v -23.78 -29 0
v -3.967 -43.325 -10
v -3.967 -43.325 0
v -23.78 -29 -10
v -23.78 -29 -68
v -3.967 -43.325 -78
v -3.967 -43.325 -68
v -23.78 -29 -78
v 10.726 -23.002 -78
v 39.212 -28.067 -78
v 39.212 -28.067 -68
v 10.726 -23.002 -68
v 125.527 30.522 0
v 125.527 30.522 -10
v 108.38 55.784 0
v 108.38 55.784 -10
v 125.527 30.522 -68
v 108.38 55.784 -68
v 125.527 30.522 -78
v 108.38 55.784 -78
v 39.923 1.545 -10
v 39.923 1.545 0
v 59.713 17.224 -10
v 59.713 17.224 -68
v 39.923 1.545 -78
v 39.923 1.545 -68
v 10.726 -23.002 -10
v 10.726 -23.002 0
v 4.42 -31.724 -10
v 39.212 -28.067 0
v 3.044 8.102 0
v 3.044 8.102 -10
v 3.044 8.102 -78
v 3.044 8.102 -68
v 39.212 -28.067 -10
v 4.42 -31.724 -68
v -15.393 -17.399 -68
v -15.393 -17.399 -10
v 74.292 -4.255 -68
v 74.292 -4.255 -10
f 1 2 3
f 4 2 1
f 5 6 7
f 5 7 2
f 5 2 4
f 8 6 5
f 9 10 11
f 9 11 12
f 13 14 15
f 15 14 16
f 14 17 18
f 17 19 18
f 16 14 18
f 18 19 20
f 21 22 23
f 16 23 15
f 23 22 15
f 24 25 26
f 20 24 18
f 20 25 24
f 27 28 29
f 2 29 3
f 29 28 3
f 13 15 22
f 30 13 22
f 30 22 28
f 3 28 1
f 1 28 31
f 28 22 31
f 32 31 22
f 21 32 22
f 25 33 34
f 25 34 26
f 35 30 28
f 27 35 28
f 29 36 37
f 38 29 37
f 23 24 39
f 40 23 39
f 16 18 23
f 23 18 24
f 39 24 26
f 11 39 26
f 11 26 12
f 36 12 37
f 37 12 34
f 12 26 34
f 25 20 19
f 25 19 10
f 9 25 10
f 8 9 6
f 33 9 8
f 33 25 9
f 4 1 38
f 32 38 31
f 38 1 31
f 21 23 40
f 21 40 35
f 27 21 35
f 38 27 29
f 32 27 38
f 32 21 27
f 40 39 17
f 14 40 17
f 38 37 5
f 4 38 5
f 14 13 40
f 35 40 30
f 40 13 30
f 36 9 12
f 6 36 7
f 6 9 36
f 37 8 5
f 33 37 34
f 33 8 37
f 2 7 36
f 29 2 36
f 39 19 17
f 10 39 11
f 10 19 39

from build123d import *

# Parameters (mm, degrees)
BOSS_EXTRUDE1_DEPTH = 10
BOSS_EXTRUDE2_DEPTH = 29


with BuildPart() as part:
    # Sketch1 → Boss-Extrude1 (new body)
    with BuildSketch(Plane.XY):
        Polygon((3.043765375, 8.102399012), (39.923255905, 1.544552589), (108.379559315, 55.783588702), (125.526610048, 30.521909453), (39.211607002, -28.066742617), (10.726491113, -23.001569193), (-3.966827285, -43.324835363), (-23.780494778, -28.999946703), align=None)
    boss_extrude1 = extrude(amount=-BOSS_EXTRUDE1_DEPTH)

    # Sketch2 → Boss-Extrude2 (add)
    with BuildSketch(Plane(origin=(0, 0, -10), x_dir=(-1, 0, 0), z_dir=(0, 0, -1))):
        Polygon((-59.712812316, 17.224138126), (-74.292234429, -4.25481419), (-125.526610048, 30.521909453), (-108.379559315, 55.783588702), align=None)
        Polygon((23.780494778, -28.999946703), (3.966827285, -43.324835363), (-4.420221287, -31.724173356), (15.393446206, -17.399284696), align=None)
    boss_extrude2 = extrude(amount=BOSS_EXTRUDE2_DEPTH)

    # Mirror1: Boss-Extrude1, Boss-Extrude2 across plane
    add(boss_extrude1.mirror(Plane.XY.offset(-39)))
    add(boss_extrude2.mirror(Plane.XY.offset(-39)))


solid = part.part
